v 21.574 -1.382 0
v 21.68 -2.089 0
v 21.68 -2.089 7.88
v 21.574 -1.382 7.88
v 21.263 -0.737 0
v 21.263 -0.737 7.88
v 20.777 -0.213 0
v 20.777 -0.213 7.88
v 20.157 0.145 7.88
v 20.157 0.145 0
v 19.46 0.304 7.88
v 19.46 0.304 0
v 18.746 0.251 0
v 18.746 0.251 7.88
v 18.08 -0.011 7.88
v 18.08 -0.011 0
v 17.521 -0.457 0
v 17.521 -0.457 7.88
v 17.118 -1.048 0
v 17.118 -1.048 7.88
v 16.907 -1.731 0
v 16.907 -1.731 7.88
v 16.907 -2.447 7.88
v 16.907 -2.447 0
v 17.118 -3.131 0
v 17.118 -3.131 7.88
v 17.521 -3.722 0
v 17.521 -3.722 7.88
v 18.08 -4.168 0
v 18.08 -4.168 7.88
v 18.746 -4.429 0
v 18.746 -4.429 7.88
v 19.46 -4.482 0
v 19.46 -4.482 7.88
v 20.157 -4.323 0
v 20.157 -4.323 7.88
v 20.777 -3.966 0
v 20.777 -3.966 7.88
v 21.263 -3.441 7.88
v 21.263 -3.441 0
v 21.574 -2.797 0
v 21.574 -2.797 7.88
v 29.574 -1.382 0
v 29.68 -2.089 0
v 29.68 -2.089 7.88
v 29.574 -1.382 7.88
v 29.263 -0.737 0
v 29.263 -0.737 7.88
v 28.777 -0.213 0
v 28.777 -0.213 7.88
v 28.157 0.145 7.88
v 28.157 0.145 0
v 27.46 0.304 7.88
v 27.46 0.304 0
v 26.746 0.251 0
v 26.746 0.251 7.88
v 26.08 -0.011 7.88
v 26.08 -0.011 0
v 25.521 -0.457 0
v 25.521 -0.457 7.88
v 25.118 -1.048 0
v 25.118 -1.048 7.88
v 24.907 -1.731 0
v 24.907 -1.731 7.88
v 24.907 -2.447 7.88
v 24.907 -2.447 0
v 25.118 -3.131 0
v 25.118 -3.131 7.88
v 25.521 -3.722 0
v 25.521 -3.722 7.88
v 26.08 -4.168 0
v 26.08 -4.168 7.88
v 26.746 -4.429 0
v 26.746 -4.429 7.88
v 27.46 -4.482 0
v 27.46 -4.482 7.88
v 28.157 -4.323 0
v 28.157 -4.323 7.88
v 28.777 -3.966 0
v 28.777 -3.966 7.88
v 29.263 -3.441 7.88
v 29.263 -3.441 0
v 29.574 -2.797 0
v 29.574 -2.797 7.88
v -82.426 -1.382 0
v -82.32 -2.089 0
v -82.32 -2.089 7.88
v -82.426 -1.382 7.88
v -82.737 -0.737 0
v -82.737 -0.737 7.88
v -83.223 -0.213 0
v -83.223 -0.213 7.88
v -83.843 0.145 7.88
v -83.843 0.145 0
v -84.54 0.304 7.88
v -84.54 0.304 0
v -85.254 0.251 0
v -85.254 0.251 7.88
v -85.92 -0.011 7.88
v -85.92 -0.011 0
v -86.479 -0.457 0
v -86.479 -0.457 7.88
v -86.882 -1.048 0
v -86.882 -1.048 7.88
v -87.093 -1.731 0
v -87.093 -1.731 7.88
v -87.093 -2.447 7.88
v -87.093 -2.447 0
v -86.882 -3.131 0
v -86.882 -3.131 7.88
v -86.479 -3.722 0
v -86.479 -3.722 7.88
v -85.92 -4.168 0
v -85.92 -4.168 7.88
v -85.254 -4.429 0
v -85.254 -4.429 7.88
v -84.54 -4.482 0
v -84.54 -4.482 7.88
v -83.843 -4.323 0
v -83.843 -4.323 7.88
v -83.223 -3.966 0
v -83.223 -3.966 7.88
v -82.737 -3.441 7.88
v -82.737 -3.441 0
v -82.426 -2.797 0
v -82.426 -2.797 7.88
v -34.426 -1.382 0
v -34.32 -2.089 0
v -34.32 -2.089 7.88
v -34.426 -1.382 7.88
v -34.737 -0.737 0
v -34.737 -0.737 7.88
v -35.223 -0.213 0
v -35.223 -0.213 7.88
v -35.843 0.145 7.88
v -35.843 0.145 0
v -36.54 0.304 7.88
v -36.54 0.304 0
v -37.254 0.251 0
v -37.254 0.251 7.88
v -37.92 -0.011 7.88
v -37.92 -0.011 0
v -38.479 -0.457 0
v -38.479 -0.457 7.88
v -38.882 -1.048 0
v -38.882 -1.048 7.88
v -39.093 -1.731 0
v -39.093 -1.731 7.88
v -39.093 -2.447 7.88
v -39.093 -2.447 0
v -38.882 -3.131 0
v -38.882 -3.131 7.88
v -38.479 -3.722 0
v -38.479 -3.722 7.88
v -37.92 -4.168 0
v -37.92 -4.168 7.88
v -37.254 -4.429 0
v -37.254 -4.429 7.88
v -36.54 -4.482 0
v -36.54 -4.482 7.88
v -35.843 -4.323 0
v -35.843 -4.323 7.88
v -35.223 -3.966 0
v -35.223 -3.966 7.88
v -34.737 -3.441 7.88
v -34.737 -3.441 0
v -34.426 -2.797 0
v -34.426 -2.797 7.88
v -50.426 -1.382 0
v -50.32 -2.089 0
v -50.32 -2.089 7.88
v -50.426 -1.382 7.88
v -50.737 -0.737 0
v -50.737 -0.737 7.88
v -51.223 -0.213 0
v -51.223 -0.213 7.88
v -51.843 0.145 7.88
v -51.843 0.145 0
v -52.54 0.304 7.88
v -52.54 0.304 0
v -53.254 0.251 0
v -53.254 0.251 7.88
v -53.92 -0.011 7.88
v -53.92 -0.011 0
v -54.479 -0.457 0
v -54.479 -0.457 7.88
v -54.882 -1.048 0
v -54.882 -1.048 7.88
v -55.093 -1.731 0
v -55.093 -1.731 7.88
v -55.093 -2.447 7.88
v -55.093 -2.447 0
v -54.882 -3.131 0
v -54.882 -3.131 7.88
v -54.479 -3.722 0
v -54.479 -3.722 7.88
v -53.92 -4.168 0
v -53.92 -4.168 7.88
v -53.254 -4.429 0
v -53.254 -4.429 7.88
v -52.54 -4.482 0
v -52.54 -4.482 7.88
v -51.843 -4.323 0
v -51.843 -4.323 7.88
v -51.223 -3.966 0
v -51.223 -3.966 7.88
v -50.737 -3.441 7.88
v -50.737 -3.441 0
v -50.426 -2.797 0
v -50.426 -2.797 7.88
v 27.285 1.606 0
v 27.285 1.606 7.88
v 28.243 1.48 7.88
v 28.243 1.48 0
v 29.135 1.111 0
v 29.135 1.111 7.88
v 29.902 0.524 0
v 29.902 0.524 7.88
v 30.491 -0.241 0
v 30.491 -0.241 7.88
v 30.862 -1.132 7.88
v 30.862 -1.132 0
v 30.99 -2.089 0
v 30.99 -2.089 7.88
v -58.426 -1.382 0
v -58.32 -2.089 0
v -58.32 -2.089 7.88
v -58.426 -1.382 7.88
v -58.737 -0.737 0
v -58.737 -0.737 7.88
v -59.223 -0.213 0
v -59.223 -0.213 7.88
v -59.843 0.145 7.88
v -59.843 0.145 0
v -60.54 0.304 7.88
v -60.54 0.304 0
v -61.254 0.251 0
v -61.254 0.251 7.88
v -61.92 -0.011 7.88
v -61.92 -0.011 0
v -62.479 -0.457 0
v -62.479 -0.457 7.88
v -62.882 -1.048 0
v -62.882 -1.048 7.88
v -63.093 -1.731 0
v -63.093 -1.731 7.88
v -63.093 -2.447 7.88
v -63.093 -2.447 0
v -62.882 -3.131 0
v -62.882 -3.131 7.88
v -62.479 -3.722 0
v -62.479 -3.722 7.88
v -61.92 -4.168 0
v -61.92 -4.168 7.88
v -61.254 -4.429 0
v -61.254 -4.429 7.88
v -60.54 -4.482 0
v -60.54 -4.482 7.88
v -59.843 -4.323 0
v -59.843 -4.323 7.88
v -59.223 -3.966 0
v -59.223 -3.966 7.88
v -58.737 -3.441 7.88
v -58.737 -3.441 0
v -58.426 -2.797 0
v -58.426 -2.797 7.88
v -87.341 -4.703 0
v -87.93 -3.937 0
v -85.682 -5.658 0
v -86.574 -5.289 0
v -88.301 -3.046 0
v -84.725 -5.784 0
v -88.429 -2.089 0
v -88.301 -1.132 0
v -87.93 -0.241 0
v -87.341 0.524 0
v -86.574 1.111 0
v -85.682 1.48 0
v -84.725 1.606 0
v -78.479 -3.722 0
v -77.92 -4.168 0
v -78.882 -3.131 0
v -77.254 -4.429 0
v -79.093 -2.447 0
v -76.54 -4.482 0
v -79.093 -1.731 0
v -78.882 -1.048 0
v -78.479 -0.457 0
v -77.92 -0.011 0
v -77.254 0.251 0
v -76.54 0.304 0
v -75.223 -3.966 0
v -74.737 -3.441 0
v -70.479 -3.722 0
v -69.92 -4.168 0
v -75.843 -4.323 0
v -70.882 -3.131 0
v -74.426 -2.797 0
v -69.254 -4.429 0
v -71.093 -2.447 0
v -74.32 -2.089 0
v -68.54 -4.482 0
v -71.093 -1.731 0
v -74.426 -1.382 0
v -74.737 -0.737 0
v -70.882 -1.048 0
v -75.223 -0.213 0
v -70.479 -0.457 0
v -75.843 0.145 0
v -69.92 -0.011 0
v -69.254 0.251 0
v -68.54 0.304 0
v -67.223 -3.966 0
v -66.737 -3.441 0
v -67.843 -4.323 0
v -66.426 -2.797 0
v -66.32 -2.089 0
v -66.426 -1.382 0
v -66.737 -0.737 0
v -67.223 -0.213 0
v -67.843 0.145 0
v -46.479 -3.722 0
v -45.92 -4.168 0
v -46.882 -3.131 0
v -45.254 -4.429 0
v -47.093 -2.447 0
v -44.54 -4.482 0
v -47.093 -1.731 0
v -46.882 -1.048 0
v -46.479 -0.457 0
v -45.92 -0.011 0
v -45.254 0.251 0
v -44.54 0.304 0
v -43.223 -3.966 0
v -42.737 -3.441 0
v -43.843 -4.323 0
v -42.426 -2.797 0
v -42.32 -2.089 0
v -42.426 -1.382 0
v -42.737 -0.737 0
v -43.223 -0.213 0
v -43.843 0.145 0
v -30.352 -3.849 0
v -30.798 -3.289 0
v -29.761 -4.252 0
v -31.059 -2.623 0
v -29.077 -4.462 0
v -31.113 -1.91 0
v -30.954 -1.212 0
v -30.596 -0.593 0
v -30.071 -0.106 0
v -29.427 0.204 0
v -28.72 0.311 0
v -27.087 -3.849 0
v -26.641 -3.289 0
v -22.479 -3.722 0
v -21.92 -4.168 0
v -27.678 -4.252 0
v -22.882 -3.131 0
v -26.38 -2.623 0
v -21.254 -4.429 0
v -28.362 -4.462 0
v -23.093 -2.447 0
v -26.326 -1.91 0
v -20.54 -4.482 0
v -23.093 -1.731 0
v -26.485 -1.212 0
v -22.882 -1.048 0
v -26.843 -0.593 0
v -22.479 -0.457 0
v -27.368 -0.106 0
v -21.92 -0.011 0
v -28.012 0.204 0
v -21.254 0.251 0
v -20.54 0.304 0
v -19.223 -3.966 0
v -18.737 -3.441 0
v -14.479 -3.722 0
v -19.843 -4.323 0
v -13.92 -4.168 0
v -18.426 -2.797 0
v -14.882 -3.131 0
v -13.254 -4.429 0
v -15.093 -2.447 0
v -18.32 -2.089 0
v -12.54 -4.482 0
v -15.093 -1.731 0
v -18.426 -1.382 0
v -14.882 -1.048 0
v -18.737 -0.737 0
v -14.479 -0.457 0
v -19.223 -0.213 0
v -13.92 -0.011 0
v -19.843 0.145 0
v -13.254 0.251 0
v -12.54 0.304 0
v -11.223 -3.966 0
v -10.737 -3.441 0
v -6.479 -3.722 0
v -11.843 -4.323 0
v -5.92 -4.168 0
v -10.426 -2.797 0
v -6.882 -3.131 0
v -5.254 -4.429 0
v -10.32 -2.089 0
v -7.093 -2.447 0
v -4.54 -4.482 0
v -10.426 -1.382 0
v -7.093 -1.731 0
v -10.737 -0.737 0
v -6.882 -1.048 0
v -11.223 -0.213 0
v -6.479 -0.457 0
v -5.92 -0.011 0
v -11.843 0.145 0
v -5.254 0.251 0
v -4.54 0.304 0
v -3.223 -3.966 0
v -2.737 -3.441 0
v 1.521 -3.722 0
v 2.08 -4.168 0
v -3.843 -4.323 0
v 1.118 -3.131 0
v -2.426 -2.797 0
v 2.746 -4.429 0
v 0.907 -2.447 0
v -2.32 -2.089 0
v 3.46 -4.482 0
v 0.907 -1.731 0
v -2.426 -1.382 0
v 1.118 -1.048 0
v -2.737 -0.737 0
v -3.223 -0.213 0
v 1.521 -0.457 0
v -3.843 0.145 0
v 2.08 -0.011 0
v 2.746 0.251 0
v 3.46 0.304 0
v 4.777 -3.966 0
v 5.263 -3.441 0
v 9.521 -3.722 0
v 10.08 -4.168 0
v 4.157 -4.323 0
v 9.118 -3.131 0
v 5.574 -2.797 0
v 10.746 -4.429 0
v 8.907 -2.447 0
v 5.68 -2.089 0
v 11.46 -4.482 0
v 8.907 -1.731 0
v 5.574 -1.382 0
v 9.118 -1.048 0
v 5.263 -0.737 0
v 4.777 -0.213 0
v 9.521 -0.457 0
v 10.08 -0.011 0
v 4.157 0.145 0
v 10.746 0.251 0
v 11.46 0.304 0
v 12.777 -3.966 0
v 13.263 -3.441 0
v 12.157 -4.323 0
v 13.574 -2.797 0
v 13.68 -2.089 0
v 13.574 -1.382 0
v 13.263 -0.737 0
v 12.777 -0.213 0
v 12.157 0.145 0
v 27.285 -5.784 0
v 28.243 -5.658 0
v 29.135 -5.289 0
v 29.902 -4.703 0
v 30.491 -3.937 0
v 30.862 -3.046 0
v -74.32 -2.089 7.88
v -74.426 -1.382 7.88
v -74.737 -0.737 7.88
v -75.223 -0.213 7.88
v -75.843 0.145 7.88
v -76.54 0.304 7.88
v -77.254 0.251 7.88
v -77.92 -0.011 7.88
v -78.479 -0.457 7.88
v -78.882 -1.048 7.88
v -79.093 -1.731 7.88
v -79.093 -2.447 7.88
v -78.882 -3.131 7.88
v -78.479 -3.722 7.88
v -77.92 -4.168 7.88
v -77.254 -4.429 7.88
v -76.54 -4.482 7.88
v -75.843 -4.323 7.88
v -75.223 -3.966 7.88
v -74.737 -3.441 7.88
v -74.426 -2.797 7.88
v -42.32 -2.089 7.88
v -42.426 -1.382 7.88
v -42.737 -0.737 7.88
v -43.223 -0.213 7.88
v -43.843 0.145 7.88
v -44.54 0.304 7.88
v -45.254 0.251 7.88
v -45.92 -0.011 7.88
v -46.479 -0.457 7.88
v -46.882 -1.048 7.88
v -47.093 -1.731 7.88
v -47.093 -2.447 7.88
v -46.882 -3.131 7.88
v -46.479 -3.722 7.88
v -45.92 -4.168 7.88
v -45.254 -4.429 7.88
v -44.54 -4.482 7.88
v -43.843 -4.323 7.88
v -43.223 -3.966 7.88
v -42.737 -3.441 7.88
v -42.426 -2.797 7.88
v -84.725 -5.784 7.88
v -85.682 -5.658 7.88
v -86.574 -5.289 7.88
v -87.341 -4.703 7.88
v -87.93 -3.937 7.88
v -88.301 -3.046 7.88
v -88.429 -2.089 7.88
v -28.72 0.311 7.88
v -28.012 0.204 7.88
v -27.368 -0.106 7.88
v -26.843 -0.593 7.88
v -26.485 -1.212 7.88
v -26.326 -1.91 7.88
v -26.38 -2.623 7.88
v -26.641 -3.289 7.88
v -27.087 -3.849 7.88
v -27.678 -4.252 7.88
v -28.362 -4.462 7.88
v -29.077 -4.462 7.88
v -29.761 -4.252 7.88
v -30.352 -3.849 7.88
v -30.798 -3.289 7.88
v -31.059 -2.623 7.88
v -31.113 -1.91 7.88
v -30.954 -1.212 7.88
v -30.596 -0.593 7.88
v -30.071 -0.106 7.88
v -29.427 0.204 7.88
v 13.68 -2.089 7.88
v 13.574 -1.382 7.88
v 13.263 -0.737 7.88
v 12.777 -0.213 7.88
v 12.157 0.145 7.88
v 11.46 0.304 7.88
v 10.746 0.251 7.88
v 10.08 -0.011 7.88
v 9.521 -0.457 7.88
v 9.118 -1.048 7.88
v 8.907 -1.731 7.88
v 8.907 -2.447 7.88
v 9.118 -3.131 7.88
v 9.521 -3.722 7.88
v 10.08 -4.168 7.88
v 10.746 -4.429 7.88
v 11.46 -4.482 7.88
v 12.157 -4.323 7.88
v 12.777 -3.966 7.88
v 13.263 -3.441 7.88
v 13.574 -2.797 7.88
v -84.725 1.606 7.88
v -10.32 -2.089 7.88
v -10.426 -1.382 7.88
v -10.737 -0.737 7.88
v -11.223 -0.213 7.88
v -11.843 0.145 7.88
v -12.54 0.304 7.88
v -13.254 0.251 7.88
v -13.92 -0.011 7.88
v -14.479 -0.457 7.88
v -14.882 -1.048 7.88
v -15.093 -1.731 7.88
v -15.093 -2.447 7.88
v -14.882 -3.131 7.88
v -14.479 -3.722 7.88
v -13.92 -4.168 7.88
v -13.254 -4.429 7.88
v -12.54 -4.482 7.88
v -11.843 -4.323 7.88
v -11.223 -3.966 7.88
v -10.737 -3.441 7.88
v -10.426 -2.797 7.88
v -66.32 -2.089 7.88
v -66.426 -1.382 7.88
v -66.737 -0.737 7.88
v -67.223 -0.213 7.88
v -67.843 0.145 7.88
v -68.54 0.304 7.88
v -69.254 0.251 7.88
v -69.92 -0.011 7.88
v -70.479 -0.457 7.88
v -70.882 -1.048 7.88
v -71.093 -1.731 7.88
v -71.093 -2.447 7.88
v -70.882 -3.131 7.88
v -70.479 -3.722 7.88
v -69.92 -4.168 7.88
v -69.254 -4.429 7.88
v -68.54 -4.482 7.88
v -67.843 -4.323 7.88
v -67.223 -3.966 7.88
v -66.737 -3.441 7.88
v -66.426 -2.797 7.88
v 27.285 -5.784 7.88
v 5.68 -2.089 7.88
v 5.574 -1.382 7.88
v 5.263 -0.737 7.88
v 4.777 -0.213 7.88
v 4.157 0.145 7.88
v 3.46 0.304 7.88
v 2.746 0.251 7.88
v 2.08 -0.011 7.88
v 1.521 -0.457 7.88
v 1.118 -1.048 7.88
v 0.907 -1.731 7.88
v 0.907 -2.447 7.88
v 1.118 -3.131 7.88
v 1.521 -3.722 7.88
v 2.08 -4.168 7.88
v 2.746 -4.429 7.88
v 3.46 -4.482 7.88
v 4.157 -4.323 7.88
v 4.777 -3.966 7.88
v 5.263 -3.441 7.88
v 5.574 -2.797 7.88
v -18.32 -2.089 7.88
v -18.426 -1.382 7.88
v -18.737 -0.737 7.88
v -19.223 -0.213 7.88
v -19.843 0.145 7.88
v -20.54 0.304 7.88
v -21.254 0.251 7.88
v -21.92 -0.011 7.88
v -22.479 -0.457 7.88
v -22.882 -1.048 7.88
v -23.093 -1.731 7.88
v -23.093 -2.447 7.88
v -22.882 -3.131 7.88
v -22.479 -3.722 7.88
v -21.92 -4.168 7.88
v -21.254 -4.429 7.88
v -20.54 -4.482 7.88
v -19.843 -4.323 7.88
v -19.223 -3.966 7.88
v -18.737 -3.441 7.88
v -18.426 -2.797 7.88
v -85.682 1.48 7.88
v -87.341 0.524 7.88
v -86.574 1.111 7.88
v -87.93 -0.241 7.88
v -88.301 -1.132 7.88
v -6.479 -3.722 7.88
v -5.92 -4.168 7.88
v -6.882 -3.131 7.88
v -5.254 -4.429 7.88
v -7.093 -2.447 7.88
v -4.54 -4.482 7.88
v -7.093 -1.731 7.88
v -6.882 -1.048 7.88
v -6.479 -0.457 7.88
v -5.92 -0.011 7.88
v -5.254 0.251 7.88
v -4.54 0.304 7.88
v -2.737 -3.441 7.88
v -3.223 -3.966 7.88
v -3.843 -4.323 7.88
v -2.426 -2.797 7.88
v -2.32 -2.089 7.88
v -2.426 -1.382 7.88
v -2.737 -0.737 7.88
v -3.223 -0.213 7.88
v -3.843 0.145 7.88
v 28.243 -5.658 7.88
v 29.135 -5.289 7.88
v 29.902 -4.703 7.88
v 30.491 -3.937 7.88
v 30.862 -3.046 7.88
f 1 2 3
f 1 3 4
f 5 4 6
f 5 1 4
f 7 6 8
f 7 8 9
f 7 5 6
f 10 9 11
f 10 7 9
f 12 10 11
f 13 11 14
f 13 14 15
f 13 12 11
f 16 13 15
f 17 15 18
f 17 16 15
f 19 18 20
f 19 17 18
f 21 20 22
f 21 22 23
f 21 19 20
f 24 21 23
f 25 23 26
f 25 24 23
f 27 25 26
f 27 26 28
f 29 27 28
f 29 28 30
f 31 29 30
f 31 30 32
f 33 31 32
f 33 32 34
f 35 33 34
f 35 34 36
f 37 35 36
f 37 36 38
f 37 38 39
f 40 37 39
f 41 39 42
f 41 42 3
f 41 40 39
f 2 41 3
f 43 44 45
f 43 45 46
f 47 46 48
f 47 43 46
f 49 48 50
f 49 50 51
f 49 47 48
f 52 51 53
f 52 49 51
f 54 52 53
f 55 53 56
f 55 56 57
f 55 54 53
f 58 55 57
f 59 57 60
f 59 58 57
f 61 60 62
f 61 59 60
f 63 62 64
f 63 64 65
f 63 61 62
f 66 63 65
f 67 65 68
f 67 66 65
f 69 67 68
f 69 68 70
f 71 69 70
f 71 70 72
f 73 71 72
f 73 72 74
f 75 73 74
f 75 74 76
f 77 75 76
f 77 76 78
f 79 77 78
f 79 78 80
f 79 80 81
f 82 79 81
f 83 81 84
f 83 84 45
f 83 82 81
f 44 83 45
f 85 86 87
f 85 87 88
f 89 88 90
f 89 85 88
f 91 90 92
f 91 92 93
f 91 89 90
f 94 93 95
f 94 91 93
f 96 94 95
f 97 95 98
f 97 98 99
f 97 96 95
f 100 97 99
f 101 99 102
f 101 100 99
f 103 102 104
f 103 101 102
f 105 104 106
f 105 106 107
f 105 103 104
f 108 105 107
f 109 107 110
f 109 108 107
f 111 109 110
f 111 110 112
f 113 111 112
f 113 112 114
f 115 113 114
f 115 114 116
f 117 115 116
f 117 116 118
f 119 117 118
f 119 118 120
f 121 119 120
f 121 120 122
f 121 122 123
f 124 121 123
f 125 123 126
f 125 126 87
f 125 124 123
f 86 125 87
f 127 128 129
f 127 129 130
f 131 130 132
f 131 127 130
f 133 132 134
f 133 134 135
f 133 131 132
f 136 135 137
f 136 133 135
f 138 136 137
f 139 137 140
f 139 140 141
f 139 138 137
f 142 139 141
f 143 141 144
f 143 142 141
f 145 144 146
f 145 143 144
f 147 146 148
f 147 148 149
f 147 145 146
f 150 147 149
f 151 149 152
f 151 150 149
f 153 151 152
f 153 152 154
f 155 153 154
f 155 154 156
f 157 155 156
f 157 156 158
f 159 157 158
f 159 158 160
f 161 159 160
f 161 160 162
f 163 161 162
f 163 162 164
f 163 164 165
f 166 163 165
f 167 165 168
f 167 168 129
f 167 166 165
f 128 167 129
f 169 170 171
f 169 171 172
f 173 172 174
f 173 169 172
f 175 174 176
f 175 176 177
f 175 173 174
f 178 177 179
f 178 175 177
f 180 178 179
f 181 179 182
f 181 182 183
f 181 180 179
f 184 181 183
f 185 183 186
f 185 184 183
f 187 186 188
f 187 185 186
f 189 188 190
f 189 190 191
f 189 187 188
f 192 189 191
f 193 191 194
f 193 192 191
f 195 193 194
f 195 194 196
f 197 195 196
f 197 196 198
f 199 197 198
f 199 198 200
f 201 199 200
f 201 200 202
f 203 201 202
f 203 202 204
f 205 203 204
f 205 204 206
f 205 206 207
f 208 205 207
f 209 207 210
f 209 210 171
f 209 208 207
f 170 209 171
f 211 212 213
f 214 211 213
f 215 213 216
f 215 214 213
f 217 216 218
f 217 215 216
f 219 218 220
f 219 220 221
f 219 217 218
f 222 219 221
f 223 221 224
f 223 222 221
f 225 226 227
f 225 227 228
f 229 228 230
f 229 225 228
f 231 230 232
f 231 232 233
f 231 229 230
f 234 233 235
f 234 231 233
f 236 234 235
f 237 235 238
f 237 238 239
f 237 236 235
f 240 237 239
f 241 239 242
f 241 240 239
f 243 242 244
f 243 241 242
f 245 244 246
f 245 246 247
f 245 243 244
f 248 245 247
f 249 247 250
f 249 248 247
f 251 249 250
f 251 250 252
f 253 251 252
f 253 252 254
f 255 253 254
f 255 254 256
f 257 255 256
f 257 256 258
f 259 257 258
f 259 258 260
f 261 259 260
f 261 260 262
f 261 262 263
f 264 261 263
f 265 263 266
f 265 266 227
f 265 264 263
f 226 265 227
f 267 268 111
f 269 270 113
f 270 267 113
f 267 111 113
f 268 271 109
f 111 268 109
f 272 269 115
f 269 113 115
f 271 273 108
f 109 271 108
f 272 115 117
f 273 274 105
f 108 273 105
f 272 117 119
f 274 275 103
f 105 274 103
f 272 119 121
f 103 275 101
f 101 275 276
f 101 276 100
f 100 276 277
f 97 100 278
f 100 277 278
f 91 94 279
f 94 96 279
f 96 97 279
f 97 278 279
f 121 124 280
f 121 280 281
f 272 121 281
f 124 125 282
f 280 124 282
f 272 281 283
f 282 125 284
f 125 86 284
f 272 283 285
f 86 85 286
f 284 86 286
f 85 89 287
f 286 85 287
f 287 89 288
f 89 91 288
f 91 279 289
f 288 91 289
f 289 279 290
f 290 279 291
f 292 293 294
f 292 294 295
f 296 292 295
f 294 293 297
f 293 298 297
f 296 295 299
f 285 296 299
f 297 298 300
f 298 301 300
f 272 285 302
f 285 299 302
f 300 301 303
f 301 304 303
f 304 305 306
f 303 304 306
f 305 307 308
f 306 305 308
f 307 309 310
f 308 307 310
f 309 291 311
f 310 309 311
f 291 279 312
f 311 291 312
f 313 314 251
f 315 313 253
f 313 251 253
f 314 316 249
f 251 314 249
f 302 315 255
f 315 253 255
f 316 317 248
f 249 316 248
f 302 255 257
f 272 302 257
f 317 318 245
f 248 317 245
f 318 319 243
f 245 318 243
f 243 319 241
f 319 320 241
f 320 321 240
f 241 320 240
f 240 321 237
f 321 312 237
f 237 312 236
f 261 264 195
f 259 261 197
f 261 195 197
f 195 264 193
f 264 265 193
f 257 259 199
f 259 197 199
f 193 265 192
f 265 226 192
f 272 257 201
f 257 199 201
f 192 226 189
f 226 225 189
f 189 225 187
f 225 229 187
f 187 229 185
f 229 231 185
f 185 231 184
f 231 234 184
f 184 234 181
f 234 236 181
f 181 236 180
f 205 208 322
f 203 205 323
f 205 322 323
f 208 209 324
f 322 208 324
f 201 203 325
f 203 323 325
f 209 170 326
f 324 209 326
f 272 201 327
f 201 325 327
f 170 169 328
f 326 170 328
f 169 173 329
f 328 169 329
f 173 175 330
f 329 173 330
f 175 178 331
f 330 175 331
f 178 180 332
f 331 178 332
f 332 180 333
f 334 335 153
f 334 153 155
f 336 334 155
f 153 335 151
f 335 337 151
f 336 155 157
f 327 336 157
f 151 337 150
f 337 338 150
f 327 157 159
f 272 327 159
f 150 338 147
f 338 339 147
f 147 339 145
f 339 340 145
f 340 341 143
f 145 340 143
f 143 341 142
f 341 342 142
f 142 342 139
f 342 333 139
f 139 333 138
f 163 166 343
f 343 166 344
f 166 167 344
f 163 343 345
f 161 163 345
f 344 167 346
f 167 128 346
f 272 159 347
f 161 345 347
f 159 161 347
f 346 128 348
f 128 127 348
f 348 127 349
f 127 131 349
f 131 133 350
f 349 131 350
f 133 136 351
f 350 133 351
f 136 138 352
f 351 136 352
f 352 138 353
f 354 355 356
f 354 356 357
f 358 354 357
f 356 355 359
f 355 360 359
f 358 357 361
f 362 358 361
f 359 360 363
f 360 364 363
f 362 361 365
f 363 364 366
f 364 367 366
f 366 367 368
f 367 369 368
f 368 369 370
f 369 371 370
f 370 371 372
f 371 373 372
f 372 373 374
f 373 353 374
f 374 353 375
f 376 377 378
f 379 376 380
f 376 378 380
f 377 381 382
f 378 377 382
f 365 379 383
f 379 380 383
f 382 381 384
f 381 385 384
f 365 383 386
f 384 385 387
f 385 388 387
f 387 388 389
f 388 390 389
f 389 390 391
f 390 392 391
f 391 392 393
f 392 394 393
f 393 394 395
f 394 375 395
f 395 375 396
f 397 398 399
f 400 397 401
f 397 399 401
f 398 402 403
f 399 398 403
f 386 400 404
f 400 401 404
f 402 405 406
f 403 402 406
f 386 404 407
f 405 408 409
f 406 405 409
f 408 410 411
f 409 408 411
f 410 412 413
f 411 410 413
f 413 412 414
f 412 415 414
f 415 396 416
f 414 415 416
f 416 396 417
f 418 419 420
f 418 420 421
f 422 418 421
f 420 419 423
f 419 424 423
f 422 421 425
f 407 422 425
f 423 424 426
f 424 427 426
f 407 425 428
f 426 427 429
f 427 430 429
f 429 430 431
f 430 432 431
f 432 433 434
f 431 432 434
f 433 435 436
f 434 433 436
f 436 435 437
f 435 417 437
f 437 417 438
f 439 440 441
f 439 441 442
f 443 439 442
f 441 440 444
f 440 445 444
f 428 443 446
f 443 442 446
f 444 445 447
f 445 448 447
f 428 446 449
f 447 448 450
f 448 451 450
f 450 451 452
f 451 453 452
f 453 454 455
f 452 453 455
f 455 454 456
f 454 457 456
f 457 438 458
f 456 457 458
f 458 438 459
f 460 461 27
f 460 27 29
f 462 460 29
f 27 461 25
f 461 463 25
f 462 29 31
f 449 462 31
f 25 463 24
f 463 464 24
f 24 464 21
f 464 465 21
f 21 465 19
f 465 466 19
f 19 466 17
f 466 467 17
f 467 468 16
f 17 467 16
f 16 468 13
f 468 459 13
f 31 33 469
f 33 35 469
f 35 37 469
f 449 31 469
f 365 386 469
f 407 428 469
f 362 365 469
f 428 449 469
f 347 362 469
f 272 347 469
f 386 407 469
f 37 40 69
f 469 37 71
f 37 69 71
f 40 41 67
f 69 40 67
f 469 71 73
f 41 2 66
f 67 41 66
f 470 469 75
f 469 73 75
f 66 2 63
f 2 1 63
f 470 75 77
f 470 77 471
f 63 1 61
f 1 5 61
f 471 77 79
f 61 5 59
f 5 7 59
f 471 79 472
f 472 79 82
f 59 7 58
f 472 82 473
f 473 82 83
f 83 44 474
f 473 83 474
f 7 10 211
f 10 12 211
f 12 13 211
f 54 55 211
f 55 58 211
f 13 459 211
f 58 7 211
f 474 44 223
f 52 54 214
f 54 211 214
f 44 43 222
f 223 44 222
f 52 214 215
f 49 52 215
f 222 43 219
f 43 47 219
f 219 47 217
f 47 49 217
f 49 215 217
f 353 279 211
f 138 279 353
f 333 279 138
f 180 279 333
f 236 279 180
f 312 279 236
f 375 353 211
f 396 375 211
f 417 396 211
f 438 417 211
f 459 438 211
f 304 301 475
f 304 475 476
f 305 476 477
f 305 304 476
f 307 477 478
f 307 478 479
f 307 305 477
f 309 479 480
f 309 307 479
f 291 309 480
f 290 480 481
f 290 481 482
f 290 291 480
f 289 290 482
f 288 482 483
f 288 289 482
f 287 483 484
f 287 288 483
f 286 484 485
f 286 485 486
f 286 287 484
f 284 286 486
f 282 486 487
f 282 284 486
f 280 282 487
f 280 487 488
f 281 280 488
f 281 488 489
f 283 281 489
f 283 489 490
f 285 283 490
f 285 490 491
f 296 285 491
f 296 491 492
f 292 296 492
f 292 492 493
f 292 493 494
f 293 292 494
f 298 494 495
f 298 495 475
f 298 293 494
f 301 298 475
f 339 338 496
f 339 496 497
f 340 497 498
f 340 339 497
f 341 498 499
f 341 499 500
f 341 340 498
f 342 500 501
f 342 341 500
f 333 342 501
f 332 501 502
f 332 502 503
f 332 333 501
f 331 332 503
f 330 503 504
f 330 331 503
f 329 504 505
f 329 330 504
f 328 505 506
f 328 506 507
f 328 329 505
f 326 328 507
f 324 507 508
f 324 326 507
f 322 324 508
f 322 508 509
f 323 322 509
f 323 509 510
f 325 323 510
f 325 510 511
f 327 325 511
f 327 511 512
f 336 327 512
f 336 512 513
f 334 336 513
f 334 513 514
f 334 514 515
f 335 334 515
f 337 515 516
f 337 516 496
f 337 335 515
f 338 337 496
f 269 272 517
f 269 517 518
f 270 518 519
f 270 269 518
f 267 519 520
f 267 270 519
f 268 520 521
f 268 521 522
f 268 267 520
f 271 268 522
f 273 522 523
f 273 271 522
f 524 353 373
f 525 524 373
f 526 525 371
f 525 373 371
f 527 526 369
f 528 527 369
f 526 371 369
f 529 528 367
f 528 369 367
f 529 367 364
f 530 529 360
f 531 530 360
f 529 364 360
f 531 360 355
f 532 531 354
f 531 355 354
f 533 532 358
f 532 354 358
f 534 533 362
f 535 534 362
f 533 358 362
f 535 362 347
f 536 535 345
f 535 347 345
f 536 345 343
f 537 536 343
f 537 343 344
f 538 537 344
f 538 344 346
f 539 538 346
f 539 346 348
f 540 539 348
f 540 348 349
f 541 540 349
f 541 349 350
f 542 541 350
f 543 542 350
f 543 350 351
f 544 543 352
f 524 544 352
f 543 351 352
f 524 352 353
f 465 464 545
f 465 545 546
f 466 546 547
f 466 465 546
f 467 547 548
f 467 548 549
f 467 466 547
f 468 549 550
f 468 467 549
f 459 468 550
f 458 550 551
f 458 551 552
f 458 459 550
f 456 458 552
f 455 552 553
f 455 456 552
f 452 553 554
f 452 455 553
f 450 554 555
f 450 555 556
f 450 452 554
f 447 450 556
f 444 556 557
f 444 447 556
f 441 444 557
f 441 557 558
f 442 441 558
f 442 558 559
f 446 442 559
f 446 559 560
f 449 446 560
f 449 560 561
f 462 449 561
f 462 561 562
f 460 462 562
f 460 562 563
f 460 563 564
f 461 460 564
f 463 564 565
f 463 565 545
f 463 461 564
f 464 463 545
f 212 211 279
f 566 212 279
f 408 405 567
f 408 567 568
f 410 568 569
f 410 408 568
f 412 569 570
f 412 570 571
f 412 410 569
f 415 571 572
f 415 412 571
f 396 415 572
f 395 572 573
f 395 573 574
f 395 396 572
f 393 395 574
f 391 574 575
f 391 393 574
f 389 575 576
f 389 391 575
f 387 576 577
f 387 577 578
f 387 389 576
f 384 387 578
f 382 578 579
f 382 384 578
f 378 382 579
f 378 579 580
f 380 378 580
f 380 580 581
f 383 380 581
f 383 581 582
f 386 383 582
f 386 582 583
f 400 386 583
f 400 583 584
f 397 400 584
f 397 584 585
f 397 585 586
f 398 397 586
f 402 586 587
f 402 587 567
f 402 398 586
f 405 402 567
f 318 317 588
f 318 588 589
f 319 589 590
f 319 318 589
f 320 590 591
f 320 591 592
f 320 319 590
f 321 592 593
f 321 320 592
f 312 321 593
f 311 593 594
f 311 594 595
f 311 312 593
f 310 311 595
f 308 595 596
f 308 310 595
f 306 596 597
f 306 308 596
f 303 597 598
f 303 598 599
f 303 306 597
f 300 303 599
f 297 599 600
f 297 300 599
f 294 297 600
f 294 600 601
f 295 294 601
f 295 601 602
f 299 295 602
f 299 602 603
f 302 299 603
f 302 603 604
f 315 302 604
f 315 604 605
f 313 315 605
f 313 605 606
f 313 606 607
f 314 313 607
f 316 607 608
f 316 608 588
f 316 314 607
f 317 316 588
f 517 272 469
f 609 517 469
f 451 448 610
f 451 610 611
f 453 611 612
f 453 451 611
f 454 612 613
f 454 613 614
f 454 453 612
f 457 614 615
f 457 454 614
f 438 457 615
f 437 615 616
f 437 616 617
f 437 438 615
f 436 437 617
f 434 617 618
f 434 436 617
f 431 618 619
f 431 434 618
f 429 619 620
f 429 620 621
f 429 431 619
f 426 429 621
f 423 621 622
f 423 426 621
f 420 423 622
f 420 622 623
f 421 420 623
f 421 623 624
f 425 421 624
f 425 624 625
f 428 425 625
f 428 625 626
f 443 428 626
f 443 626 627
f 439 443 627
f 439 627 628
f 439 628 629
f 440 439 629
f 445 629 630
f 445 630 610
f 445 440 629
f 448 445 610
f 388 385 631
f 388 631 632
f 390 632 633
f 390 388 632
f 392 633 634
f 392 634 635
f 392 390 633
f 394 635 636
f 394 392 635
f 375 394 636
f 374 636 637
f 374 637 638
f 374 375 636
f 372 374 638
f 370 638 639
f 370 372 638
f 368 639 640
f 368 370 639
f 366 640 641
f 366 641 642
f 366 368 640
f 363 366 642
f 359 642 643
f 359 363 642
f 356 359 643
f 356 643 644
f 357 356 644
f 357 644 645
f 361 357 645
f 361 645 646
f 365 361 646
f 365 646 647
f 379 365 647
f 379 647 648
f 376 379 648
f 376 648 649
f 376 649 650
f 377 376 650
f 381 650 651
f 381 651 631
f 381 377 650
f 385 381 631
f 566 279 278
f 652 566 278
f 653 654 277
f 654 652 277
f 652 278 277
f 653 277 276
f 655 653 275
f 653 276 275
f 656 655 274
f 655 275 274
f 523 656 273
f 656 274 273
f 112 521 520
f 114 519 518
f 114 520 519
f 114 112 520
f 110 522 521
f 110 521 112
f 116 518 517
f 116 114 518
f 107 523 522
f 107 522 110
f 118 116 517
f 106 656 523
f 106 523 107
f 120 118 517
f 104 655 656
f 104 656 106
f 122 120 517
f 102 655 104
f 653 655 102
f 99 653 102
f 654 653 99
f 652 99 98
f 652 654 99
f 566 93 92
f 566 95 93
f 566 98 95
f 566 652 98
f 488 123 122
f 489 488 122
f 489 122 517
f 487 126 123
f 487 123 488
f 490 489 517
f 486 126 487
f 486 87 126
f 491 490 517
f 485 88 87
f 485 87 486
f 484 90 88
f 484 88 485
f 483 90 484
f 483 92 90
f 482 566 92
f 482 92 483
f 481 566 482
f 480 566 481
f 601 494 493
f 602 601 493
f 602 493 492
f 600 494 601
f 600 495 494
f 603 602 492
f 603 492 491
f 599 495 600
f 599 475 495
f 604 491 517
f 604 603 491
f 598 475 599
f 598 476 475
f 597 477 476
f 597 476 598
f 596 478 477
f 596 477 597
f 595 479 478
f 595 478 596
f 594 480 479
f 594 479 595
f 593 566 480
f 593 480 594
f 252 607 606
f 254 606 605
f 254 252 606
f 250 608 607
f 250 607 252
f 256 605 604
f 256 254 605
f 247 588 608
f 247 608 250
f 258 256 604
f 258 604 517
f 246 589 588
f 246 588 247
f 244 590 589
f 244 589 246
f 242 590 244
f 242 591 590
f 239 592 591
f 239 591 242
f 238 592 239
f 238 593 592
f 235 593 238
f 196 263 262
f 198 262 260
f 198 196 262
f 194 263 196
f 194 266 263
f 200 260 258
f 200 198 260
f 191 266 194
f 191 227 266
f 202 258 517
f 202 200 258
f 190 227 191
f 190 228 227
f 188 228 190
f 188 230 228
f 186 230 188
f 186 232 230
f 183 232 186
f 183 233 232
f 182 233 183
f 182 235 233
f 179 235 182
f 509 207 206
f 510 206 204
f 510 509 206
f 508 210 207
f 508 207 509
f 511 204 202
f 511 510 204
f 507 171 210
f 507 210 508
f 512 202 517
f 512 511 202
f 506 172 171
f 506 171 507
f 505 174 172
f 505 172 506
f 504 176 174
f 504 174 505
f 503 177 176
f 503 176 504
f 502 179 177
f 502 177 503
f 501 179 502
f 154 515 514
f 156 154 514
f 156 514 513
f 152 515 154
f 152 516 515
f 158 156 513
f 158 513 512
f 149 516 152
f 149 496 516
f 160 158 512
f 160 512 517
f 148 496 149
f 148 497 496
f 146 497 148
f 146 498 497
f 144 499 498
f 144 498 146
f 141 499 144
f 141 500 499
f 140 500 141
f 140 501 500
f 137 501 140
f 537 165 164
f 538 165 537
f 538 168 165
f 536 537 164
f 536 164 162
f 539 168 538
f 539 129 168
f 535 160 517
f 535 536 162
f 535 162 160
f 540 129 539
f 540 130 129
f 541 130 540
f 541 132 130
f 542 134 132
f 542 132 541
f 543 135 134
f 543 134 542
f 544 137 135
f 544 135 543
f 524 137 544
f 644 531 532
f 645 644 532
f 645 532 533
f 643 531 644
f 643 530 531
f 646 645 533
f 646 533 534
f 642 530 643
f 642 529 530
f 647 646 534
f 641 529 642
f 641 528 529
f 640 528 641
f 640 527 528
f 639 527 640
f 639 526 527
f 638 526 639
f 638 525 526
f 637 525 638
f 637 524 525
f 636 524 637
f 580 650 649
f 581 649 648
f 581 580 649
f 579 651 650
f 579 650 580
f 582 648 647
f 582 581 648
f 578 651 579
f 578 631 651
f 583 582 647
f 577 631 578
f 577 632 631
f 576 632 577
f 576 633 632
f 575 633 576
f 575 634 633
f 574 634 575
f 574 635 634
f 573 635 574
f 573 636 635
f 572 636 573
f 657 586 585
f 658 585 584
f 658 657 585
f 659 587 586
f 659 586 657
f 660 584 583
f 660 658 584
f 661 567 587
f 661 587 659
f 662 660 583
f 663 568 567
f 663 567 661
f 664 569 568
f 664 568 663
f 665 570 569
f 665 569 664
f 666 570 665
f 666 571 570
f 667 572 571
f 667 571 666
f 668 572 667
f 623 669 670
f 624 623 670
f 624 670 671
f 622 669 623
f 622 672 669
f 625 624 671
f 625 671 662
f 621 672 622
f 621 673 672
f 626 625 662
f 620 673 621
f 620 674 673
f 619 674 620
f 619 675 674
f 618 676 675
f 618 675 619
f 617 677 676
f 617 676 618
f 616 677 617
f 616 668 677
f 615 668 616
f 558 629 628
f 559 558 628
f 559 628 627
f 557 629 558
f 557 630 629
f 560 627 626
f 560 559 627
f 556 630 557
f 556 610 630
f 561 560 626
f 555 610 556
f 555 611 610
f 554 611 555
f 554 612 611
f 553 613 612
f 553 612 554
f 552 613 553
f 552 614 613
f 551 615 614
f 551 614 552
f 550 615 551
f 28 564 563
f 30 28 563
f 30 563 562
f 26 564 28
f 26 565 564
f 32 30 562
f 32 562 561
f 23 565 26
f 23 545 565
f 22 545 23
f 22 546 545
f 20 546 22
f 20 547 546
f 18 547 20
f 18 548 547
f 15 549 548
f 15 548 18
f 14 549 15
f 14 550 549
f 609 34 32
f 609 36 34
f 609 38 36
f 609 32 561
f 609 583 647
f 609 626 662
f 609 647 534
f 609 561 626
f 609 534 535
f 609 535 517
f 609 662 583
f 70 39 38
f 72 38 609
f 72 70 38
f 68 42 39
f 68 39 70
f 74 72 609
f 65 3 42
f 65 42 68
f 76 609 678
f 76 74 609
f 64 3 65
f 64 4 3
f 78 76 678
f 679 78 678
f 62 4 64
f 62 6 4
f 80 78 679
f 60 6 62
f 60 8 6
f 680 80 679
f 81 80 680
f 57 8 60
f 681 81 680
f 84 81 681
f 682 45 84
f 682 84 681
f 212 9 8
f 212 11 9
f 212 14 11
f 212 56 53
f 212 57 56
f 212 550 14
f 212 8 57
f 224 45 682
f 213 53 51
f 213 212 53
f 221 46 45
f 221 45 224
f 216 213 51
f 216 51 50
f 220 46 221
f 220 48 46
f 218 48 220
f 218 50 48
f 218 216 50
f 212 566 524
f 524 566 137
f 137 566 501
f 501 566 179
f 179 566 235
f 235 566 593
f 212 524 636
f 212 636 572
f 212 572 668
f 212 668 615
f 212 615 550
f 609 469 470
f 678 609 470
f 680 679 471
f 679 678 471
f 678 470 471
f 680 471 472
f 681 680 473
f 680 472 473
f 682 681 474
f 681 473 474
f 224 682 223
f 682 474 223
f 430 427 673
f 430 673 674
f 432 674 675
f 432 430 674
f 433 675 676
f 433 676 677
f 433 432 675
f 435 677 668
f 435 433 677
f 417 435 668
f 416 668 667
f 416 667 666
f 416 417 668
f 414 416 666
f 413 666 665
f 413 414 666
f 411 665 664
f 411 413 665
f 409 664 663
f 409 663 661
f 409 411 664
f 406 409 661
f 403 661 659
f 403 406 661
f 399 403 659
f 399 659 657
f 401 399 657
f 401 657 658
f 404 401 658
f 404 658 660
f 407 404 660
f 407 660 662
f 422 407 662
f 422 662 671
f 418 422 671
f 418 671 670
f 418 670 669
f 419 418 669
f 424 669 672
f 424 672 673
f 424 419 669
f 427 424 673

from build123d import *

# Parameters (mm, degrees)
F0_R        = 2.4
F1_DEPTH    = 7.88
F2_T1_DEPTH = 26.405


# Not quite as in the source:
# - a fillet or chamfer that OpenCascade refuses, or shapes differently, is made with other operations: its cross-section is extruded or revolved along the edge and cut away or added


with BuildPart() as f1:
    # F0 (on Top) → F1 (new body)
    with BuildSketch(Plane.XY):
        Polygon((30.9904916829, 1.6058013724), (-28.7195083171, 1.6058013724), (-88.4295083171, 1.6058013724), (-88.4295083171, -2.0891986276), (-88.4295083171, -5.7841986276), (-28.7195083171, -5.7841986276), (30.9904916829, -5.7841986276), (30.9904916829, -2.0891986276), align=None)
        with Locations((-84.7195083171, -2.0891986276)):
            Circle(F0_R, mode=Mode.SUBTRACT)
        with Locations((-76.7195083171, -2.0891986276)):
            Circle(F0_R, mode=Mode.SUBTRACT)
        with Locations((-68.7195083171, -2.0891986276)):
            Circle(F0_R, mode=Mode.SUBTRACT)
        with Locations((-60.7195083171, -2.0891986276)):
            Circle(F0_R, mode=Mode.SUBTRACT)
        with Locations((-52.7195083171, -2.0891986276)):
            Circle(F0_R, mode=Mode.SUBTRACT)
        with Locations((-44.7195083171, -2.0891986276)):
            Circle(F0_R, mode=Mode.SUBTRACT)
        with Locations((-36.7195083171, -2.0891986276)):
            Circle(F0_R, mode=Mode.SUBTRACT)
        with BuildLine():
            ThreePointArc((-28.7195083171, -4.4891986276), (-31.1195083171, -2.0891986276), (-28.7195083171, 0.3108013724))
            ThreePointArc((-28.7195083171, 0.3108013724), (-26.3195083171, -2.0891986276), (-28.7195083171, -4.4891986276))
        make_face(mode=Mode.SUBTRACT)
        with Locations((-20.7195083171, -2.0891986276)):
            Circle(F0_R, mode=Mode.SUBTRACT)
        with Locations((-12.7195083171, -2.0891986276)):
            Circle(F0_R, mode=Mode.SUBTRACT)
        with Locations((-4.7195083171, -2.0891986276)):
            Circle(F0_R, mode=Mode.SUBTRACT)
        with Locations((3.2804916829, -2.0891986276)):
            Circle(F0_R, mode=Mode.SUBTRACT)
        with Locations((11.2804916829, -2.0891986276)):
            Circle(F0_R, mode=Mode.SUBTRACT)
        with Locations((19.2804916829, -2.0891986276)):
            Circle(F0_R, mode=Mode.SUBTRACT)
        with Locations((27.2804916829, -2.0891986276)):
            Circle(F0_R, mode=Mode.SUBTRACT)
    extrude(amount=F1_DEPTH)

    # F2: fillet of radius 3.705 on 4 edges, made by hand

    # F2_s2 → F2_t1 (cut)
    with BuildSketch(Plane.XY.offset(-9.2625)):
        with BuildLine():
            ThreePointArc((27.2854916829, 1.6058013724), (29.9053223072, 0.5206319967), (30.9904916829, -2.0991986276))
            Line((30.9904916829, -2.0991986276), (30.9904916829, 1.6058013724))
            Line((30.9904916829, 1.6058013724), (27.2854916829, 1.6058013724))
        make_face()
        with BuildLine():
            ThreePointArc((27.2854916829, -5.7841986276), (29.9053223072, -4.6990292519), (30.9904916829, -2.0791986276))
            Line((30.9904916829, -2.0791986276), (30.9904916829, -5.7841986276))
            Line((30.9904916829, -5.7841986276), (27.2854916829, -5.7841986276))
        make_face()
        with BuildLine():
            ThreePointArc((-84.7245083171, 1.6058013724), (-87.3443389413, 0.5206319967), (-88.4295083171, -2.0991986276))
            Line((-88.4295083171, -2.0991986276), (-88.4295083171, 1.6058013724))
            Line((-88.4295083171, 1.6058013724), (-84.7245083171, 1.6058013724))
        make_face()
        with BuildLine():
            ThreePointArc((-84.7245083171, -5.7841986276), (-87.3443389413, -4.6990292519), (-88.4295083171, -2.0791986276))
            Line((-88.4295083171, -2.0791986276), (-88.4295083171, -5.7841986276))
            Line((-88.4295083171, -5.7841986276), (-84.7245083171, -5.7841986276))
        make_face()
    extrude(amount=F2_T1_DEPTH, mode=Mode.SUBTRACT)


solid = f1.part
